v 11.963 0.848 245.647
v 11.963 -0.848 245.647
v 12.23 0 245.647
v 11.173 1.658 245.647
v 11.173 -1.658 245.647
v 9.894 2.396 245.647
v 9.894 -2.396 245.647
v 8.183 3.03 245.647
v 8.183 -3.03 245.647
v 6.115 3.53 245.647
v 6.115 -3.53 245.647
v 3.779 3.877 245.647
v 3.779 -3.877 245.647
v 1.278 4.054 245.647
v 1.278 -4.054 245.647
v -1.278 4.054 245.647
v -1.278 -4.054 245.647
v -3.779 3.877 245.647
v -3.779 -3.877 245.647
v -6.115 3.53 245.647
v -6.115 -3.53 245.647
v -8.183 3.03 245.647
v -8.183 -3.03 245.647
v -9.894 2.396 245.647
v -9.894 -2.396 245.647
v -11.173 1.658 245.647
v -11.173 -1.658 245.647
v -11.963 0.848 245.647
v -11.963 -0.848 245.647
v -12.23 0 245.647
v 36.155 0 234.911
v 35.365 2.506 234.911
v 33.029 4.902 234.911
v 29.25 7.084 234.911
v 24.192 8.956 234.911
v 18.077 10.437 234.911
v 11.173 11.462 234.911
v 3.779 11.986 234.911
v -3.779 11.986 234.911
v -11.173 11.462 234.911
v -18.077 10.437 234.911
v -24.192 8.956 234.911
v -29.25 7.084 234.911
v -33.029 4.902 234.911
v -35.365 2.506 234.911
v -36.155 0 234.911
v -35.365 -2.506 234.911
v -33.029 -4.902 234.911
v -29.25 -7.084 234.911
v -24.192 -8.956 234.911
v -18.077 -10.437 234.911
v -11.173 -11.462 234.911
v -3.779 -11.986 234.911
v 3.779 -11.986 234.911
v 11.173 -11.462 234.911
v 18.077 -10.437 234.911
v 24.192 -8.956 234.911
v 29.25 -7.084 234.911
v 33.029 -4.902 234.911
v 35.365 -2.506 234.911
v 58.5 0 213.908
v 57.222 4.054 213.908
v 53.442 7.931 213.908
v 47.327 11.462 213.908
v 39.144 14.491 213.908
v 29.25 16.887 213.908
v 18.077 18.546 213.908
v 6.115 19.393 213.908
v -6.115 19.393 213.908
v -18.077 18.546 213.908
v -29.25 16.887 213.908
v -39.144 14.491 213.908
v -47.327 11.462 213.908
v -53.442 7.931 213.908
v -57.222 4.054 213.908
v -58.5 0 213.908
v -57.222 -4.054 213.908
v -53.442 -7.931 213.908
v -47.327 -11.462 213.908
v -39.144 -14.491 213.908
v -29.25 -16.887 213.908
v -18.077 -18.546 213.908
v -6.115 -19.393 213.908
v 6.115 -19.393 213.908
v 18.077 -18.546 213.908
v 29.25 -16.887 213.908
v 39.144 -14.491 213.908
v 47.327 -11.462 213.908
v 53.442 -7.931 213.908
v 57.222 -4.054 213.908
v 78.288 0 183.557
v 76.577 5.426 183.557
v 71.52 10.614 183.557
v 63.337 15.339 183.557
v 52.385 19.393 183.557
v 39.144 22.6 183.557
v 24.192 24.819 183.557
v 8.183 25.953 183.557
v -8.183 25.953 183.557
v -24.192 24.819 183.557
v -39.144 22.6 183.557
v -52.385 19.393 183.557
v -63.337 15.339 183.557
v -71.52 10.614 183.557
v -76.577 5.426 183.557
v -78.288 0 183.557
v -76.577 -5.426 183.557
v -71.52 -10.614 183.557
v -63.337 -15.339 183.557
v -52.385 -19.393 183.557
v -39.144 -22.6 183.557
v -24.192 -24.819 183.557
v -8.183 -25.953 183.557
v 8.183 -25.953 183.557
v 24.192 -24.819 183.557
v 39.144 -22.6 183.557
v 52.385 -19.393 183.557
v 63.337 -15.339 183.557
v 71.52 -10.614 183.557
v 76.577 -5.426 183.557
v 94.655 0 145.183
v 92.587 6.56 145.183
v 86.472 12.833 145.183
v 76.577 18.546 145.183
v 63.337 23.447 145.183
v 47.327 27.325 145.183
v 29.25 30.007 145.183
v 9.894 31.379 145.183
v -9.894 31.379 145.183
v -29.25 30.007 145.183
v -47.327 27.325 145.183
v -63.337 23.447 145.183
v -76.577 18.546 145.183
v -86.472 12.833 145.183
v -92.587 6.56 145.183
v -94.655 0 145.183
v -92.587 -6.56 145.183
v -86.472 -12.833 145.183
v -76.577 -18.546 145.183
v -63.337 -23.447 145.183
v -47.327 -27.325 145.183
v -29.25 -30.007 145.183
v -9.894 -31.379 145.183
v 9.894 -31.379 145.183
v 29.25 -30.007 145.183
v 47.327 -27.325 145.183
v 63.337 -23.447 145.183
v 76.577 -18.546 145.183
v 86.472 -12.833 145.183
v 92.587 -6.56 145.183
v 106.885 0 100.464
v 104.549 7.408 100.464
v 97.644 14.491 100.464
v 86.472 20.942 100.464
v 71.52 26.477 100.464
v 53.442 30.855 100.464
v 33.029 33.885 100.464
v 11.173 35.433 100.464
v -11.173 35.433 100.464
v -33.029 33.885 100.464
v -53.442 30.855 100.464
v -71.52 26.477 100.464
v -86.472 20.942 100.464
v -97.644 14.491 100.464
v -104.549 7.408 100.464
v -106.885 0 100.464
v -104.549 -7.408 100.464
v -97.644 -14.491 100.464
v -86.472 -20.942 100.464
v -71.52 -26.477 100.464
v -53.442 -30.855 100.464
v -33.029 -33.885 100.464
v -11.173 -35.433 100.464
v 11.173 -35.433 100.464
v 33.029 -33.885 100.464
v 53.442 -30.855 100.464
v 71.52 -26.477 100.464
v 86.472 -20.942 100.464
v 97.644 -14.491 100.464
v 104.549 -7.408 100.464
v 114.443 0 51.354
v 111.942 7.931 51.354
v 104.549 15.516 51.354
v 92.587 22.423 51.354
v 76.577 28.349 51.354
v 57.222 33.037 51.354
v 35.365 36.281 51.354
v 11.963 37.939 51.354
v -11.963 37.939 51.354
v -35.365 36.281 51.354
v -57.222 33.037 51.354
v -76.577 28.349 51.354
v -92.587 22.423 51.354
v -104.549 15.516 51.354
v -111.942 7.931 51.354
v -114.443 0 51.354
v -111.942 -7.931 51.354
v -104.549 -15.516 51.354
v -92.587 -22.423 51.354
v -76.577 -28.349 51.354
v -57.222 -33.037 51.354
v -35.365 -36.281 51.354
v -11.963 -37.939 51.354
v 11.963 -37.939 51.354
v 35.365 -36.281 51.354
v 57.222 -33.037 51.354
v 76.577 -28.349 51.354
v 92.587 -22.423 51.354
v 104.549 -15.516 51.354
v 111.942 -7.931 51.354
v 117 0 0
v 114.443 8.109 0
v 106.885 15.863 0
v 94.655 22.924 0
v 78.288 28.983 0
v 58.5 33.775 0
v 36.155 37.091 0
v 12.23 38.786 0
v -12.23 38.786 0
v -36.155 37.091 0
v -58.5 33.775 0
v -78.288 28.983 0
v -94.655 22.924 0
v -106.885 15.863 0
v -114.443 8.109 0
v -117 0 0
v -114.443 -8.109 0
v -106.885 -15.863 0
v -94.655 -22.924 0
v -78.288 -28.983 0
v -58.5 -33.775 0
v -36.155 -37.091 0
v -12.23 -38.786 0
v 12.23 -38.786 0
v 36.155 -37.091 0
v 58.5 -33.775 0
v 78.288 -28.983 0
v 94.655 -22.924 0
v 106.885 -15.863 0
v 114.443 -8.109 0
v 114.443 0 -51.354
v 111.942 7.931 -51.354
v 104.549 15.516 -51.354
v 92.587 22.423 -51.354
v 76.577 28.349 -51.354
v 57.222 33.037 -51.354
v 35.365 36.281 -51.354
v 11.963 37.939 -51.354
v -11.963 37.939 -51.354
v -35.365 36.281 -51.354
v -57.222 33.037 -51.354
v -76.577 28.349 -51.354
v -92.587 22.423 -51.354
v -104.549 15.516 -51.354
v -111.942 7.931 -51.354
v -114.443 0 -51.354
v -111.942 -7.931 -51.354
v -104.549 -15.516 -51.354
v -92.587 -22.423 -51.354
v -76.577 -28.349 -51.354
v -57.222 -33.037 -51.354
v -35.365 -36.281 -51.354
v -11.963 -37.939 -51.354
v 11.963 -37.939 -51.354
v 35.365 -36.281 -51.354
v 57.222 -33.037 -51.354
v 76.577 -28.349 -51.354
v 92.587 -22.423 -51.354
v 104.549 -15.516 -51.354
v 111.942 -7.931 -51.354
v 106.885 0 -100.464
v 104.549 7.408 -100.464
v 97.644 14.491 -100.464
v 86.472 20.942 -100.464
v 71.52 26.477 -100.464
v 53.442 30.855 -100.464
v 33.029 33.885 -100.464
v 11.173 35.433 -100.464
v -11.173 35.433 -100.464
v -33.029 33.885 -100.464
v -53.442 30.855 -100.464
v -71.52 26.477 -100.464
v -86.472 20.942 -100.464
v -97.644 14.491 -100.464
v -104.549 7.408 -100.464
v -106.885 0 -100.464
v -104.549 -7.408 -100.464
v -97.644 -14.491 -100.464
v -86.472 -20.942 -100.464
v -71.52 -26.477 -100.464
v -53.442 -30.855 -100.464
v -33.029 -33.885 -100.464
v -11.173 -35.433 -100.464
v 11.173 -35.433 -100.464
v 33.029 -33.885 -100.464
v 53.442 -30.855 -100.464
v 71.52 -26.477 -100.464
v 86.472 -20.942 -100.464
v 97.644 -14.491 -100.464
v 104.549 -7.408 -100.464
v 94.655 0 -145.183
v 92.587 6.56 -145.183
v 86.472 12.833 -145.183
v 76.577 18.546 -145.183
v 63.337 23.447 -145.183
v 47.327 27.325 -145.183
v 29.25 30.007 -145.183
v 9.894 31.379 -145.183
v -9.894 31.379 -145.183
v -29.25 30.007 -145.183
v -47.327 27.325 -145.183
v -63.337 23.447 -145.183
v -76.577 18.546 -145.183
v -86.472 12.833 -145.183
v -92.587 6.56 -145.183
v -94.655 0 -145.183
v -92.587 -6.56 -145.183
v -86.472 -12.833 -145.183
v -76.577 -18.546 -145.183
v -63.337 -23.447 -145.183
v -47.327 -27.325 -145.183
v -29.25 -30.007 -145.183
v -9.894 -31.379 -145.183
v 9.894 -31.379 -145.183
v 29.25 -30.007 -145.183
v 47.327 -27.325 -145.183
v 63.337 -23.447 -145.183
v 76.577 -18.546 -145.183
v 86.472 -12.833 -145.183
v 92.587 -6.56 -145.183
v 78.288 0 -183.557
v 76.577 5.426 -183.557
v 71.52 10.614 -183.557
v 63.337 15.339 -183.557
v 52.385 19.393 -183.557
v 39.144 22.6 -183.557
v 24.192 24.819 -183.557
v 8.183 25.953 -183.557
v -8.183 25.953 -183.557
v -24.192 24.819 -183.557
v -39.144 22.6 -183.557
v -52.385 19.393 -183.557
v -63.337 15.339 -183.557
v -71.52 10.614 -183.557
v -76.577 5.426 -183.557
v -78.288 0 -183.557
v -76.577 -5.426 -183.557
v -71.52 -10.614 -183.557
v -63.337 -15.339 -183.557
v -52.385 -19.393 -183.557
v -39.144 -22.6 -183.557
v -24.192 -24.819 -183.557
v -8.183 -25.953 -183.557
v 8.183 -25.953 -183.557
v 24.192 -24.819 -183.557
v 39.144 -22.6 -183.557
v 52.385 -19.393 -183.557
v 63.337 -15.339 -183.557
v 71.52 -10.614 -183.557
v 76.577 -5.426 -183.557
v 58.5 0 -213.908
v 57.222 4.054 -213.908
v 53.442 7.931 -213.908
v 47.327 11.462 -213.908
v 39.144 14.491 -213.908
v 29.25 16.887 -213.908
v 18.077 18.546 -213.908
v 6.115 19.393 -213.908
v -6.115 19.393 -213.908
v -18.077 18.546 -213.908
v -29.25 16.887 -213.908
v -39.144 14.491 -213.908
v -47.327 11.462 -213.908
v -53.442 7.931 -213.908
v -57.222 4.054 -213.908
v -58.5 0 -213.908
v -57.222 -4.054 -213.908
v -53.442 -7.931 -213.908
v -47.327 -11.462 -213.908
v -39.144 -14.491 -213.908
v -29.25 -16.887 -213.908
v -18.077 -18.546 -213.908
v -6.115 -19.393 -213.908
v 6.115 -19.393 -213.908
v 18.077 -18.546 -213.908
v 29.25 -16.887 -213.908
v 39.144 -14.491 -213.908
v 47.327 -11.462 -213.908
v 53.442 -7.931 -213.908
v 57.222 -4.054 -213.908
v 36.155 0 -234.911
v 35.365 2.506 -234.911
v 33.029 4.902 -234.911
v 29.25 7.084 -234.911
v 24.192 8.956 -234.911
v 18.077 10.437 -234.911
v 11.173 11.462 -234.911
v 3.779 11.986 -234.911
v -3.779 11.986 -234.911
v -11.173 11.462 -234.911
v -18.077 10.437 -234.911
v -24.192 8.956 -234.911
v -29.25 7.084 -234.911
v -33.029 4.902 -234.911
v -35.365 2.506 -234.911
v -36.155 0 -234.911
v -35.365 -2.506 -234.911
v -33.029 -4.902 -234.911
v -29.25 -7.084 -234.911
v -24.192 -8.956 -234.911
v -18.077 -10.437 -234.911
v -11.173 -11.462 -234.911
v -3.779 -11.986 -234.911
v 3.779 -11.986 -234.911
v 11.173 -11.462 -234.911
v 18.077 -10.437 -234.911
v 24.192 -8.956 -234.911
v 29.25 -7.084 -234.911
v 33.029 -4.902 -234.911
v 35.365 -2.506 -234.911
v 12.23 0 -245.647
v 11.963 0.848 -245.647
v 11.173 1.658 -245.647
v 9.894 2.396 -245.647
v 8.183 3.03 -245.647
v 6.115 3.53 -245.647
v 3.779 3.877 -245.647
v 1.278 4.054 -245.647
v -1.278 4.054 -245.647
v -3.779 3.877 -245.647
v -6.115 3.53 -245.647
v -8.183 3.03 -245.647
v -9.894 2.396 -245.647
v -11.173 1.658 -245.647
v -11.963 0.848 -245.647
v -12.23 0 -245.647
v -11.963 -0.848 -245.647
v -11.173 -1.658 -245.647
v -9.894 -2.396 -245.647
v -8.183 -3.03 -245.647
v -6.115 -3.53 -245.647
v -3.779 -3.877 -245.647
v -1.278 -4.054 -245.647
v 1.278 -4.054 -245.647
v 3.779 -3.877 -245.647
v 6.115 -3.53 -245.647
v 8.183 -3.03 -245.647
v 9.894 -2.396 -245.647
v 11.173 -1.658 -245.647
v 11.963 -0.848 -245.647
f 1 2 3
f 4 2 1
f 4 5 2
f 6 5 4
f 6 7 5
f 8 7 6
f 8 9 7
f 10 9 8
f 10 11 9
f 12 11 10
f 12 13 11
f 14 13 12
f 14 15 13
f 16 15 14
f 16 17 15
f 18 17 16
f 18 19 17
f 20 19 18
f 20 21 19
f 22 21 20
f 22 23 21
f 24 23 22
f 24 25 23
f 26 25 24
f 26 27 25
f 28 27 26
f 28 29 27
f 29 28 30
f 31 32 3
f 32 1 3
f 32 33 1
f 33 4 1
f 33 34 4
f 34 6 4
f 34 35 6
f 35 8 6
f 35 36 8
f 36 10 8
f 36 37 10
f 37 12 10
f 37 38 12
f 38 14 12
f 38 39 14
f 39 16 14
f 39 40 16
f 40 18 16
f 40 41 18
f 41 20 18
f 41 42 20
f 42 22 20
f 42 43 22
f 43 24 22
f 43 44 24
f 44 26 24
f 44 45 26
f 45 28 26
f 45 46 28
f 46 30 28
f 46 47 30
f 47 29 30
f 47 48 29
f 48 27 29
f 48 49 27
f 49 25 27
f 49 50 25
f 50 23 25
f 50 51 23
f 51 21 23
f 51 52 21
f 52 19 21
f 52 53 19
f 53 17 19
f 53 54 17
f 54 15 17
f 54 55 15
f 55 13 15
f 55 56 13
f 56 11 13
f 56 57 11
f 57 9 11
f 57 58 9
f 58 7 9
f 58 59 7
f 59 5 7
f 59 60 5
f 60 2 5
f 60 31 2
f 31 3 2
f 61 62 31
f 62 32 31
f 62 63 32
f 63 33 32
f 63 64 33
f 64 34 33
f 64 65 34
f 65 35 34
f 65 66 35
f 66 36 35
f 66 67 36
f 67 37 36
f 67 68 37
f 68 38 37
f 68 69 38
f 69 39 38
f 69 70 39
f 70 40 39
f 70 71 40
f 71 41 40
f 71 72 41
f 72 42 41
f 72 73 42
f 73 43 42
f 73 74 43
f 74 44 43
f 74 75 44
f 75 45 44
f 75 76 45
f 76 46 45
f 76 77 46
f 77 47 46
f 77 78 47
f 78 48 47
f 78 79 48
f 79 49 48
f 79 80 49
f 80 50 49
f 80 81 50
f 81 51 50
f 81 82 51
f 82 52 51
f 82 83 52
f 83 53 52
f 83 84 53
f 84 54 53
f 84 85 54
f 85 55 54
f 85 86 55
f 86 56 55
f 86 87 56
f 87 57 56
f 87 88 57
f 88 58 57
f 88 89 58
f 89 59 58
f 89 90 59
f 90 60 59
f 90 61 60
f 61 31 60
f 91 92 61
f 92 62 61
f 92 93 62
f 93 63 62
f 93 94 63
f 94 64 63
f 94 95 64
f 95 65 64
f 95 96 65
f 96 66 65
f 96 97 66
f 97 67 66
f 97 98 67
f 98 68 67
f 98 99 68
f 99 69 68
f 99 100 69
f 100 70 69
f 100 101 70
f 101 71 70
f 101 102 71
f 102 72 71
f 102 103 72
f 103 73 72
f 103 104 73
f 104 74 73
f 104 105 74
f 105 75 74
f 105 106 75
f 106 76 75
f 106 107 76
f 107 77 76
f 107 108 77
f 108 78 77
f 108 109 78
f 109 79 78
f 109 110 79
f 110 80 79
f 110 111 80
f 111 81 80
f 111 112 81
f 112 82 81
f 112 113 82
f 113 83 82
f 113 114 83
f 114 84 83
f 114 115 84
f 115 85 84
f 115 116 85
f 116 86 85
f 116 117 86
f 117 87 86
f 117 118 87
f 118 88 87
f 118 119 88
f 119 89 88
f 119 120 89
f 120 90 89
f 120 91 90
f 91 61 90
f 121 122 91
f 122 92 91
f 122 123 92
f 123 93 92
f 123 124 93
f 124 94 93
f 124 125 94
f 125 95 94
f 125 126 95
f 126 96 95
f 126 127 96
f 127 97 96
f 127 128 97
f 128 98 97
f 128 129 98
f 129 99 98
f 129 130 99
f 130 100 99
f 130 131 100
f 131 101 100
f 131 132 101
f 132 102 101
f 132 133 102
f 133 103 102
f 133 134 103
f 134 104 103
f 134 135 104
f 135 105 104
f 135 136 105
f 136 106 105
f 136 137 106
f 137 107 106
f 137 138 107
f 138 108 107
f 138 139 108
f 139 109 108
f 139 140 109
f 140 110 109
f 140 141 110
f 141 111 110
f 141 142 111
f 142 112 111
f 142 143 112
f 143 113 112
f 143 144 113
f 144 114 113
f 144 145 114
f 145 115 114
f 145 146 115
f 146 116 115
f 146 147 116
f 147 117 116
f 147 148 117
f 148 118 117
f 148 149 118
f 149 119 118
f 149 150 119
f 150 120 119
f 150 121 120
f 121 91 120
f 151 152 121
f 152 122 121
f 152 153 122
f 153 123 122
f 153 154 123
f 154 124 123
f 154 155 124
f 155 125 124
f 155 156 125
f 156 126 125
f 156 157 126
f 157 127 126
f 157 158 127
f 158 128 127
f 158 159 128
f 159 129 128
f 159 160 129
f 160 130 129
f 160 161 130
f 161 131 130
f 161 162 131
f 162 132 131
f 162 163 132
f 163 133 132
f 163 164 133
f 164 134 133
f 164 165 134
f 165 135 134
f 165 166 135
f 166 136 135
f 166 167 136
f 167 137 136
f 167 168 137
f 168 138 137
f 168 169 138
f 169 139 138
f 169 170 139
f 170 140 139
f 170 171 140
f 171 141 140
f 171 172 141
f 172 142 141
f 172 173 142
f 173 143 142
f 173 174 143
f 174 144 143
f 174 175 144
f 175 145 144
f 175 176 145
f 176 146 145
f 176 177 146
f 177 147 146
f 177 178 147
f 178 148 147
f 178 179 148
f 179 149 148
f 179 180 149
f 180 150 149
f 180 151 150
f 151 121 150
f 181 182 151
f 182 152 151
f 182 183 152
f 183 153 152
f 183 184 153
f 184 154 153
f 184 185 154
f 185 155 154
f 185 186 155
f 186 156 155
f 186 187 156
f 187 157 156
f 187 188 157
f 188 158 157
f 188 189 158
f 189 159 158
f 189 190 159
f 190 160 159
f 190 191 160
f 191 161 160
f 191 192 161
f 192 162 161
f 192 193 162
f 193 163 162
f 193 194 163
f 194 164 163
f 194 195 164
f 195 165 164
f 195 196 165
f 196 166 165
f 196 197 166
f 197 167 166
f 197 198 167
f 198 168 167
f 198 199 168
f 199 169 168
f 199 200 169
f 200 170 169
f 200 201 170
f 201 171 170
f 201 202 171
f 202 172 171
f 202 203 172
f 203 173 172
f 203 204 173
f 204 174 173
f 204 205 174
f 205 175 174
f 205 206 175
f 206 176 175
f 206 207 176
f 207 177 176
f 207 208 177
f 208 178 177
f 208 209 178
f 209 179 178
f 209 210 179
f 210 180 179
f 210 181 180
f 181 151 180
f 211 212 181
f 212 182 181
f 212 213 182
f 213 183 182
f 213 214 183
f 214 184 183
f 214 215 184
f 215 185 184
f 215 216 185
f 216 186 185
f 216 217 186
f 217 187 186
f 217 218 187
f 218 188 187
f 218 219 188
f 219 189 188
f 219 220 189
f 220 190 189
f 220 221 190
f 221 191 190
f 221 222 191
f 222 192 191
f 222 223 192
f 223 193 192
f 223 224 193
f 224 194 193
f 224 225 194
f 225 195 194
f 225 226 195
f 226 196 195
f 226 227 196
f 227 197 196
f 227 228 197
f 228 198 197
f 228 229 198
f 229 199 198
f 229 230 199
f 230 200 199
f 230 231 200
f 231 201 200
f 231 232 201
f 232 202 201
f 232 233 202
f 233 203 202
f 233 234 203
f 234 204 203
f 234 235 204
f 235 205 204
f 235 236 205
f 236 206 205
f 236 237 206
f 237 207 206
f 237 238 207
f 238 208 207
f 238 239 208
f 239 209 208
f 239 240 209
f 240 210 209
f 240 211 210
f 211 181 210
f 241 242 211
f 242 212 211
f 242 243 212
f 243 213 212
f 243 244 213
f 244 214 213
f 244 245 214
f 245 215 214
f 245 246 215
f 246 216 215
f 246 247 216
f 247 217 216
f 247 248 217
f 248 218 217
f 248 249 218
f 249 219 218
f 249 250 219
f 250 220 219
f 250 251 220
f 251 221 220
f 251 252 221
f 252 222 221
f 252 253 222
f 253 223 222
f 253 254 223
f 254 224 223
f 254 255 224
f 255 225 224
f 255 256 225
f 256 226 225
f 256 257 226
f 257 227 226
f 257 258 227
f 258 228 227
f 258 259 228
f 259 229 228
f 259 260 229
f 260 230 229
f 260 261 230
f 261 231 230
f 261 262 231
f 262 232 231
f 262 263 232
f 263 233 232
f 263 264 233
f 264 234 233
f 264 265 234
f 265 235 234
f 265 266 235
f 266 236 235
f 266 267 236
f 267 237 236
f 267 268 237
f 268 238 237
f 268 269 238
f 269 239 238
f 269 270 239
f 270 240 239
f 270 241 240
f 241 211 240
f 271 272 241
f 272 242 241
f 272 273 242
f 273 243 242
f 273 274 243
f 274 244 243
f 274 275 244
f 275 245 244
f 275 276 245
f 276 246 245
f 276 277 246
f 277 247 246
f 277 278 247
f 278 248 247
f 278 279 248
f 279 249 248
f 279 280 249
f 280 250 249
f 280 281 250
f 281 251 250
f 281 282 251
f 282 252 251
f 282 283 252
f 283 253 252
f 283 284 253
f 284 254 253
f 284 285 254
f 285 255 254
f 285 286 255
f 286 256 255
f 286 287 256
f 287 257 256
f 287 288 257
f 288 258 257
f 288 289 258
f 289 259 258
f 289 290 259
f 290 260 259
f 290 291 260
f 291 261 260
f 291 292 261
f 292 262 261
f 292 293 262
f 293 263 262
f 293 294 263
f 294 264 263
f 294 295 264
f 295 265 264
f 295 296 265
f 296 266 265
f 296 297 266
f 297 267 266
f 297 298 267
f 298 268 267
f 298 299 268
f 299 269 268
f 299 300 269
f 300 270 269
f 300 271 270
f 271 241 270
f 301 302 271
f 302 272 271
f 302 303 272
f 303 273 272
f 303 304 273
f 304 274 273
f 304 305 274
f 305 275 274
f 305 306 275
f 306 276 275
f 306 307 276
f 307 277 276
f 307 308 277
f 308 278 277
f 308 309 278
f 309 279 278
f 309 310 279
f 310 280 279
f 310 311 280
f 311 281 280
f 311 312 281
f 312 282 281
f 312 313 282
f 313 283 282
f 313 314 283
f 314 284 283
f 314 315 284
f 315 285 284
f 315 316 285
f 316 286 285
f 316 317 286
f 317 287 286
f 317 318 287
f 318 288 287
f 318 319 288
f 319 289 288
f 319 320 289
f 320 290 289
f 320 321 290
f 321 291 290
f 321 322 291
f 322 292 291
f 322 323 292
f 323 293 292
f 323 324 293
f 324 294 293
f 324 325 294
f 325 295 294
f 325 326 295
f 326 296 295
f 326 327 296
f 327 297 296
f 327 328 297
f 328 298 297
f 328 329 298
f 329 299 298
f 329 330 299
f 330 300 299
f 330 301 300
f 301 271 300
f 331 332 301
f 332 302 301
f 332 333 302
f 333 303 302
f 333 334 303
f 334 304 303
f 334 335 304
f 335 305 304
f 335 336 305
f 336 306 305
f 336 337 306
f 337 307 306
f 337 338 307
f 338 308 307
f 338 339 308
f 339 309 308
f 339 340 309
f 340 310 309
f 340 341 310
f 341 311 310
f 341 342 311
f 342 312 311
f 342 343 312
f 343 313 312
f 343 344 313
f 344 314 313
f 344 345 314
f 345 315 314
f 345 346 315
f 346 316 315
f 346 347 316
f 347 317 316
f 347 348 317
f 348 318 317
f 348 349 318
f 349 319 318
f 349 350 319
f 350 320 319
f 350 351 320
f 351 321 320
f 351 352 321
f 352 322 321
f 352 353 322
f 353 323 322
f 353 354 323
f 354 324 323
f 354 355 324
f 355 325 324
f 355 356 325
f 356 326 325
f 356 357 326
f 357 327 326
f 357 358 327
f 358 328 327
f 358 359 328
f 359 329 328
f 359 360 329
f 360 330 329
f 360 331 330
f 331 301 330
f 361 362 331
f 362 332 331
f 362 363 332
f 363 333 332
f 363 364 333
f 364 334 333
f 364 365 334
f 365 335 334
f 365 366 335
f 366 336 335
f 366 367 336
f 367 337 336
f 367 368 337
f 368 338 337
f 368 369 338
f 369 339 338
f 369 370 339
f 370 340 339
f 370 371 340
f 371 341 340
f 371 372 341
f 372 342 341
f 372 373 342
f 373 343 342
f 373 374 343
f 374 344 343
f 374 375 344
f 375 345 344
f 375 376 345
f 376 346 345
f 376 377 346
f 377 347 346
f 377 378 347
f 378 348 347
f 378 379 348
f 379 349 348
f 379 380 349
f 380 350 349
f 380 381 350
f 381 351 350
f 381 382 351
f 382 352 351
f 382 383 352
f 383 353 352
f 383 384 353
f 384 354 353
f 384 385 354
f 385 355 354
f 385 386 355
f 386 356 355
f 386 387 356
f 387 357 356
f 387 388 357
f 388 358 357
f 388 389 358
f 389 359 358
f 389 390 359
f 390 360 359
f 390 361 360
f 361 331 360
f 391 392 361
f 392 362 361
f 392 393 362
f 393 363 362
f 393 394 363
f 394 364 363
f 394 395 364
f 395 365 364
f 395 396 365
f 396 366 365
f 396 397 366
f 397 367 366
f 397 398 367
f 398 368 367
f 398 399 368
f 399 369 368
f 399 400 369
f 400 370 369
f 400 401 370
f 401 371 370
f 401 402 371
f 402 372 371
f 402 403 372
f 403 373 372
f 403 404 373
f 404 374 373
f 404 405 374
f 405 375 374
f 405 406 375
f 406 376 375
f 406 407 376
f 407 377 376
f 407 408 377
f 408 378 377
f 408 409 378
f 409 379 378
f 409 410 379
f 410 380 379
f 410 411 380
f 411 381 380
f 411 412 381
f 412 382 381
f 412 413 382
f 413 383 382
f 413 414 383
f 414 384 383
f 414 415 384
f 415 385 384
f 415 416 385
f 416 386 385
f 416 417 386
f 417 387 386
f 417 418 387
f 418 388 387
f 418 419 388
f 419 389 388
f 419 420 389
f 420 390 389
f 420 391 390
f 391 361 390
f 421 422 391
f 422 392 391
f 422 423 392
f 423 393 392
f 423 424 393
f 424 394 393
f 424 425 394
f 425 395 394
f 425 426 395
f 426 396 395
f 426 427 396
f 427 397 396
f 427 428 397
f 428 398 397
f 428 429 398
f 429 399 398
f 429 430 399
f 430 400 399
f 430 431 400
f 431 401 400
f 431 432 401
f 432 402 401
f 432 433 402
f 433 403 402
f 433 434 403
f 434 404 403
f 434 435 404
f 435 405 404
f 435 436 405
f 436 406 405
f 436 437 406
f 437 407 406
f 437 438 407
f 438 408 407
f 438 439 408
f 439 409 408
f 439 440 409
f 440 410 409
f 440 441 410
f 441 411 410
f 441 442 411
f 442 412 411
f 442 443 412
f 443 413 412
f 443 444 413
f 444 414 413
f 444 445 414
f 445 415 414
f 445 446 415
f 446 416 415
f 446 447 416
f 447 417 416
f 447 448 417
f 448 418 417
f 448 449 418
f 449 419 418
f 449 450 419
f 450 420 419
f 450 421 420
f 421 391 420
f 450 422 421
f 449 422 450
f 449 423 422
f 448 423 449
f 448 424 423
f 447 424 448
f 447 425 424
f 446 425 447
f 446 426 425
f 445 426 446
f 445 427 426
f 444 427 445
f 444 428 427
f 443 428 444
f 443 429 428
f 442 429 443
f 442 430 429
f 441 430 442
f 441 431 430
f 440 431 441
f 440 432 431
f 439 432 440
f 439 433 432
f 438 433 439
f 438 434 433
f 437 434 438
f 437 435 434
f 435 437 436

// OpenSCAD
// Generated by SolidPython 1.0.1 on 2020-07-29 00:46:48


scale(v = [9, 3, 19]) {
	sphere(r = 13);
}
/***********************************************
*********      SolidPython code:      **********
************************************************
 
# import packages: SolidPython
from solid import *
from solid.utils import *
from itertools import chain, combinations, permutations


class Resize:

    def __init__(self, scad_file):
        self.scad_file = scad_file
        #self.scad_file = import_scad(scad_file)
        # cone/cylinder param:
        self.r1 = 0
        self.r2 = 0
        self.h = 0
        # rectangular prism param:
        self.w = 0
        self.l = 0
        # ellipse param:
        self.r = 0

    # import OpenScad code (file name corresponds to shape)


    # classify shape + parameters
    def assign(self, param1, param2, param3):
        if self.scad_file == 'cone.scad':
            self.r1 = param1
            self.r2 = param2
            self.h = param3
        elif self.scad_file == 'cylinder.scad':
            self.r1 = param1
            self.r2 = param2
            self.h = param3
        elif self.scad_file == 'rectangularPrism.scad':
            self.h = param1
            self.l = param2
            self.w = param3
        else:
            self.r = param1
            self.h = param2

    # resize parameters
    def iterate(self):
        x = range(3, 20, 2)
        i = 1
        if self.scad_file == 'cone.scad':
            tempList = list(permutations(x, 2))
            for temp in tempList:
                param1 = temp[0]
                param2 = temp[1]
                filepath = 'produced_scad_files/' + 'cone' + str(param1) + '_' + str(param2) + '_' + '.scad'
                scad_render_to_file(cylinder(h=param1, r1=param2, r2=0), filepath)

        elif self.scad_file == 'cylinder.scad':
            tempList = list(permutations(x, 3))
            for temp in tempList:
                param1 = temp[0]
                param2 = temp[1]
                filepath = 'produced_scad_files/' + 'cylinder' + str(param1) + '_' + str(param2) + '_' + '.scad'
                scad_render_to_file(cylinder(h=param1, r1=param2, r2=param2), filepath)

        elif self.scad_file == 'rectangularPrism.scad':
            tempList = list(permutations(x, 3))
            for temp in tempList:
                param1 = temp[0]
                param2 = temp[1]
                param3 = temp[2]
                filepath = 'produced_scad_files/' + 'rectangularPrism' + str(param1) + '_' + str(param2) + '_' + str(
                    param3) + '.scad'
                scad_render_to_file(cube(size=(param1, param2, param3)), filepath)

        elif self.scad_file == 'ellipse.scad':
            tempList = list(permutations(x, 4))
            for temp in tempList:
                param1 = temp[0]
                param2 = temp[1]
                param3 = temp[2]
                param4 = temp[3]
                filepath = 'produced_scad_files/' + 'ellipse' + str(param1) + '_' + str(param2) + '_' + str(param3) + '_' + str(param4) + '.scad'
                scad_render_to_file(scale([param1, param2, param3])(sphere(r=param4)), filepath)

    def render_to_scadfile(self):
        scad_render_to_file(scad, 'example.scad') 
 
************************************************/
